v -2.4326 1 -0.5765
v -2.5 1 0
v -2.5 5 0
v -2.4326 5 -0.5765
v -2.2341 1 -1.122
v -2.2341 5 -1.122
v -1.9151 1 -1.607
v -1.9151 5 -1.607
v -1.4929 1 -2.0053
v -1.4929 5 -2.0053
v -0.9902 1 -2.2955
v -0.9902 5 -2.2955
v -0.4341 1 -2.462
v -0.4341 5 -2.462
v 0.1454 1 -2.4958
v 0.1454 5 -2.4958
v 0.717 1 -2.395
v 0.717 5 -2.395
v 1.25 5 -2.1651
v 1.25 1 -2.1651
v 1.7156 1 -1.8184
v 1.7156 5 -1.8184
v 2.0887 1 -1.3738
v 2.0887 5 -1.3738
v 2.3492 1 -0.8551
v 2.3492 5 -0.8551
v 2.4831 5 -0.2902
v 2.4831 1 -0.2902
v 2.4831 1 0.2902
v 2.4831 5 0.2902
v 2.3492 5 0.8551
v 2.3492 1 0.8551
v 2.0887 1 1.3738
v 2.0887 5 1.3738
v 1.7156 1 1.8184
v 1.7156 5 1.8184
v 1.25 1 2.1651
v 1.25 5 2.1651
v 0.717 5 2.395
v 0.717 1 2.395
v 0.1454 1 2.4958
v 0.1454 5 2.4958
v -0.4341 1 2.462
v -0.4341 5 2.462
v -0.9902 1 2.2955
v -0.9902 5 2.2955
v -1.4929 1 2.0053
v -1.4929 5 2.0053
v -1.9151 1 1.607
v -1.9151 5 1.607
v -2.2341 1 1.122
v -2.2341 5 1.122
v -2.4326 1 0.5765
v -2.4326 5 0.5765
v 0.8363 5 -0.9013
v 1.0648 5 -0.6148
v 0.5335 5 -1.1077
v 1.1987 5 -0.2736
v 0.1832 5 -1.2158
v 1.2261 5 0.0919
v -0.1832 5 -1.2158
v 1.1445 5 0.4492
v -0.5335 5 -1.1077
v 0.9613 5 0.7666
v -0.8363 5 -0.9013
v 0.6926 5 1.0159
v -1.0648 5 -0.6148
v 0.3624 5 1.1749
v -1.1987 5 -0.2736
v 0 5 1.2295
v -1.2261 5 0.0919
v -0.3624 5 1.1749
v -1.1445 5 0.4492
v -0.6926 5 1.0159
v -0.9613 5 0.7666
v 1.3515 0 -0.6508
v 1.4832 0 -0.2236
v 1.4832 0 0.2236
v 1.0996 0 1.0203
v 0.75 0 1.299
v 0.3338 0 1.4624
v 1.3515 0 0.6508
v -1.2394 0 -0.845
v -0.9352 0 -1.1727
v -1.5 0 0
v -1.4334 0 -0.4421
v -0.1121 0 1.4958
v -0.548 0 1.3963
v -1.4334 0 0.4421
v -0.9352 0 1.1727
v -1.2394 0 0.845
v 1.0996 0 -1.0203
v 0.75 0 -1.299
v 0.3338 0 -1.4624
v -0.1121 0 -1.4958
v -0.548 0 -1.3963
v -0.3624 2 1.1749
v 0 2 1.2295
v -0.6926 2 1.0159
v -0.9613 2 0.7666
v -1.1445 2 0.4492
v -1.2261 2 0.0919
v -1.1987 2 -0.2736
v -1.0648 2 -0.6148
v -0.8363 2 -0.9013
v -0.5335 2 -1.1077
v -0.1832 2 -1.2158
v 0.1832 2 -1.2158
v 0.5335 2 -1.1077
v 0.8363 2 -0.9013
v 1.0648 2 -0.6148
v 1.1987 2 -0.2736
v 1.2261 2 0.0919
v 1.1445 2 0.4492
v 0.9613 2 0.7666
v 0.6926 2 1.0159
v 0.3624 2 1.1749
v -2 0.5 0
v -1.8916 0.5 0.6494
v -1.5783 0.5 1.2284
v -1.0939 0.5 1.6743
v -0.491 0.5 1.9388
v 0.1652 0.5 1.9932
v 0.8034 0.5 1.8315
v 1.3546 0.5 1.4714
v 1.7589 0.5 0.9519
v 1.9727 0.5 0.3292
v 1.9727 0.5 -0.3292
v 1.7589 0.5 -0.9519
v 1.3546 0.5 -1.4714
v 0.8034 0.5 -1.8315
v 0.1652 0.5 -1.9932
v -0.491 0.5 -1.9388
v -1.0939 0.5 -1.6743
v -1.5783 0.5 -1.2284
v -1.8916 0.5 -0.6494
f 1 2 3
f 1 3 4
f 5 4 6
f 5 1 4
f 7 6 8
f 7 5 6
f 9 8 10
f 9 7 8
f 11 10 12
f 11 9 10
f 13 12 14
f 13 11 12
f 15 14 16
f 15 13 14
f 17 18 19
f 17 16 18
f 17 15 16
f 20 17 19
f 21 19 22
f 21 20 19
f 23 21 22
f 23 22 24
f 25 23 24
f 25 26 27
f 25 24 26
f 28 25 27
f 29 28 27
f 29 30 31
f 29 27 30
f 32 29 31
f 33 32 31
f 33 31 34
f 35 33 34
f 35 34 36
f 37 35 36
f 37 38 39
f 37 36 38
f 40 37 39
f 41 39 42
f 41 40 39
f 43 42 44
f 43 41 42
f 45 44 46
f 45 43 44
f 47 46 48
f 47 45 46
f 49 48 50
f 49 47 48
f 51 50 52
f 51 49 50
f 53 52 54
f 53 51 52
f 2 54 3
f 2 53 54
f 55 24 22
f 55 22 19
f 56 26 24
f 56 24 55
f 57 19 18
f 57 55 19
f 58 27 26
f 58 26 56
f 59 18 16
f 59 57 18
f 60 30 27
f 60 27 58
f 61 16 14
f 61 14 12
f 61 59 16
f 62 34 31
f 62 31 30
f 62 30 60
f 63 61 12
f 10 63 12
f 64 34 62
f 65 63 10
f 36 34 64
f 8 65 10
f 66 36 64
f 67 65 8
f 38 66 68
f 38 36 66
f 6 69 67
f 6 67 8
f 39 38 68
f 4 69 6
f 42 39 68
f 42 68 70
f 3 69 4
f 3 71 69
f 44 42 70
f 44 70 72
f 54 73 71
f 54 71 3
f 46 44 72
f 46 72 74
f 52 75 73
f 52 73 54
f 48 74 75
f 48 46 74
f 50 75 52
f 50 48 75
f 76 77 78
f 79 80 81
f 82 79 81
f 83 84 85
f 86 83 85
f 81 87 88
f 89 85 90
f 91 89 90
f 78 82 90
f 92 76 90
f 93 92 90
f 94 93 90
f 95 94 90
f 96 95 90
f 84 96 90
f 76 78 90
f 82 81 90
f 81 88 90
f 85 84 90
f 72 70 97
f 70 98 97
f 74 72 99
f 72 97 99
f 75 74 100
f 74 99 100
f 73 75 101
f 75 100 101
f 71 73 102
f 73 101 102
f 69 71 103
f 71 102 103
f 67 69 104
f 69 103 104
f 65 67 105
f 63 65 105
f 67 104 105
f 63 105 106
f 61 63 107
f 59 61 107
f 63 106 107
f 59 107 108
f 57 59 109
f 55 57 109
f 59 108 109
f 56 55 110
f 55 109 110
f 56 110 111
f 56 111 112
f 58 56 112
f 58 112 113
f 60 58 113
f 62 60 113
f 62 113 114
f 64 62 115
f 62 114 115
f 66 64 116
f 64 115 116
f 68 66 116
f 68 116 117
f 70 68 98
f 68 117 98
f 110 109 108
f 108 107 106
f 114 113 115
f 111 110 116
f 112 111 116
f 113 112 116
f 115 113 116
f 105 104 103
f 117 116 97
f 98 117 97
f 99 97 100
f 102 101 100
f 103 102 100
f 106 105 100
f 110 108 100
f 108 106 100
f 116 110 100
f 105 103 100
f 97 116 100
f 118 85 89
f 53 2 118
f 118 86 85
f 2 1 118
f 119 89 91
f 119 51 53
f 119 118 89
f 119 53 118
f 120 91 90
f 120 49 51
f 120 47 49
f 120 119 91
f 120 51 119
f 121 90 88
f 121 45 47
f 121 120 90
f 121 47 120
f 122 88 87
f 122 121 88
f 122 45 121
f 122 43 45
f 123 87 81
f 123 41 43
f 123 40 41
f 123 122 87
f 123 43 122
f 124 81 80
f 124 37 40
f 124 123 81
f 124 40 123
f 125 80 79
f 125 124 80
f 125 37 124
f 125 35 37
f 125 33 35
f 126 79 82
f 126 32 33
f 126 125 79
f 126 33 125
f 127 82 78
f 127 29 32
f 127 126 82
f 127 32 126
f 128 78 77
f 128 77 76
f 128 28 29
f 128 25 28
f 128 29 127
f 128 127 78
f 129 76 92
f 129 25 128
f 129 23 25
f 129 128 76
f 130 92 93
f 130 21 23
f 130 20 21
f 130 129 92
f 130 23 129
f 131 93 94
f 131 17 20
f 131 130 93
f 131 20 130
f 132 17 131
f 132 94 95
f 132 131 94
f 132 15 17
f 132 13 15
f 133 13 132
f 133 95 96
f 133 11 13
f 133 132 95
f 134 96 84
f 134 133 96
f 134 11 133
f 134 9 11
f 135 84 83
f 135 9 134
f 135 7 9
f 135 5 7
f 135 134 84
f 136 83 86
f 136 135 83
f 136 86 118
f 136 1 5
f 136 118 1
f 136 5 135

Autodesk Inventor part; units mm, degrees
ref_plane "YZ Plane" through (0, 0, 0) normal (1, 0, 0) x (0, 1, 0)
ref_plane "XZ Plane" through (0, 0, 0) normal (0, 1, 0) x (-1, 0, 0)
ref_plane "XY Plane" through (0, 0, 0) normal (0, 0, 1) x (1, 0, 0)
sketch "Sketch1" plane through (0, 0, 0) normal (0, 1, 0) x (-1, 0, 0)
  circle A0 centre (0, 0) radius 2.5
  dimension "d0" = 5
extrude "Extrusion1" add sketch "Sketch1" along normal blind 5
chamfer "Chamfer1" distance 1 angle 45 1 edges at (2.5, 0, 0)
sketch "Sketch2" plane through (0, 5, 0) normal (0, 1, 0) x (1, 0, 0)
  point P0 (0, 0)
  point P1 (0, 0)
hole "Hole1" at (0, 5, 0) direction (0, -1, 0) diameter 2.459 depth 3 thread size "M3x0.5" class "6H" standard "ISO Metric profile"
properties part number "Insert" material "Brass, Soft Yellow"
